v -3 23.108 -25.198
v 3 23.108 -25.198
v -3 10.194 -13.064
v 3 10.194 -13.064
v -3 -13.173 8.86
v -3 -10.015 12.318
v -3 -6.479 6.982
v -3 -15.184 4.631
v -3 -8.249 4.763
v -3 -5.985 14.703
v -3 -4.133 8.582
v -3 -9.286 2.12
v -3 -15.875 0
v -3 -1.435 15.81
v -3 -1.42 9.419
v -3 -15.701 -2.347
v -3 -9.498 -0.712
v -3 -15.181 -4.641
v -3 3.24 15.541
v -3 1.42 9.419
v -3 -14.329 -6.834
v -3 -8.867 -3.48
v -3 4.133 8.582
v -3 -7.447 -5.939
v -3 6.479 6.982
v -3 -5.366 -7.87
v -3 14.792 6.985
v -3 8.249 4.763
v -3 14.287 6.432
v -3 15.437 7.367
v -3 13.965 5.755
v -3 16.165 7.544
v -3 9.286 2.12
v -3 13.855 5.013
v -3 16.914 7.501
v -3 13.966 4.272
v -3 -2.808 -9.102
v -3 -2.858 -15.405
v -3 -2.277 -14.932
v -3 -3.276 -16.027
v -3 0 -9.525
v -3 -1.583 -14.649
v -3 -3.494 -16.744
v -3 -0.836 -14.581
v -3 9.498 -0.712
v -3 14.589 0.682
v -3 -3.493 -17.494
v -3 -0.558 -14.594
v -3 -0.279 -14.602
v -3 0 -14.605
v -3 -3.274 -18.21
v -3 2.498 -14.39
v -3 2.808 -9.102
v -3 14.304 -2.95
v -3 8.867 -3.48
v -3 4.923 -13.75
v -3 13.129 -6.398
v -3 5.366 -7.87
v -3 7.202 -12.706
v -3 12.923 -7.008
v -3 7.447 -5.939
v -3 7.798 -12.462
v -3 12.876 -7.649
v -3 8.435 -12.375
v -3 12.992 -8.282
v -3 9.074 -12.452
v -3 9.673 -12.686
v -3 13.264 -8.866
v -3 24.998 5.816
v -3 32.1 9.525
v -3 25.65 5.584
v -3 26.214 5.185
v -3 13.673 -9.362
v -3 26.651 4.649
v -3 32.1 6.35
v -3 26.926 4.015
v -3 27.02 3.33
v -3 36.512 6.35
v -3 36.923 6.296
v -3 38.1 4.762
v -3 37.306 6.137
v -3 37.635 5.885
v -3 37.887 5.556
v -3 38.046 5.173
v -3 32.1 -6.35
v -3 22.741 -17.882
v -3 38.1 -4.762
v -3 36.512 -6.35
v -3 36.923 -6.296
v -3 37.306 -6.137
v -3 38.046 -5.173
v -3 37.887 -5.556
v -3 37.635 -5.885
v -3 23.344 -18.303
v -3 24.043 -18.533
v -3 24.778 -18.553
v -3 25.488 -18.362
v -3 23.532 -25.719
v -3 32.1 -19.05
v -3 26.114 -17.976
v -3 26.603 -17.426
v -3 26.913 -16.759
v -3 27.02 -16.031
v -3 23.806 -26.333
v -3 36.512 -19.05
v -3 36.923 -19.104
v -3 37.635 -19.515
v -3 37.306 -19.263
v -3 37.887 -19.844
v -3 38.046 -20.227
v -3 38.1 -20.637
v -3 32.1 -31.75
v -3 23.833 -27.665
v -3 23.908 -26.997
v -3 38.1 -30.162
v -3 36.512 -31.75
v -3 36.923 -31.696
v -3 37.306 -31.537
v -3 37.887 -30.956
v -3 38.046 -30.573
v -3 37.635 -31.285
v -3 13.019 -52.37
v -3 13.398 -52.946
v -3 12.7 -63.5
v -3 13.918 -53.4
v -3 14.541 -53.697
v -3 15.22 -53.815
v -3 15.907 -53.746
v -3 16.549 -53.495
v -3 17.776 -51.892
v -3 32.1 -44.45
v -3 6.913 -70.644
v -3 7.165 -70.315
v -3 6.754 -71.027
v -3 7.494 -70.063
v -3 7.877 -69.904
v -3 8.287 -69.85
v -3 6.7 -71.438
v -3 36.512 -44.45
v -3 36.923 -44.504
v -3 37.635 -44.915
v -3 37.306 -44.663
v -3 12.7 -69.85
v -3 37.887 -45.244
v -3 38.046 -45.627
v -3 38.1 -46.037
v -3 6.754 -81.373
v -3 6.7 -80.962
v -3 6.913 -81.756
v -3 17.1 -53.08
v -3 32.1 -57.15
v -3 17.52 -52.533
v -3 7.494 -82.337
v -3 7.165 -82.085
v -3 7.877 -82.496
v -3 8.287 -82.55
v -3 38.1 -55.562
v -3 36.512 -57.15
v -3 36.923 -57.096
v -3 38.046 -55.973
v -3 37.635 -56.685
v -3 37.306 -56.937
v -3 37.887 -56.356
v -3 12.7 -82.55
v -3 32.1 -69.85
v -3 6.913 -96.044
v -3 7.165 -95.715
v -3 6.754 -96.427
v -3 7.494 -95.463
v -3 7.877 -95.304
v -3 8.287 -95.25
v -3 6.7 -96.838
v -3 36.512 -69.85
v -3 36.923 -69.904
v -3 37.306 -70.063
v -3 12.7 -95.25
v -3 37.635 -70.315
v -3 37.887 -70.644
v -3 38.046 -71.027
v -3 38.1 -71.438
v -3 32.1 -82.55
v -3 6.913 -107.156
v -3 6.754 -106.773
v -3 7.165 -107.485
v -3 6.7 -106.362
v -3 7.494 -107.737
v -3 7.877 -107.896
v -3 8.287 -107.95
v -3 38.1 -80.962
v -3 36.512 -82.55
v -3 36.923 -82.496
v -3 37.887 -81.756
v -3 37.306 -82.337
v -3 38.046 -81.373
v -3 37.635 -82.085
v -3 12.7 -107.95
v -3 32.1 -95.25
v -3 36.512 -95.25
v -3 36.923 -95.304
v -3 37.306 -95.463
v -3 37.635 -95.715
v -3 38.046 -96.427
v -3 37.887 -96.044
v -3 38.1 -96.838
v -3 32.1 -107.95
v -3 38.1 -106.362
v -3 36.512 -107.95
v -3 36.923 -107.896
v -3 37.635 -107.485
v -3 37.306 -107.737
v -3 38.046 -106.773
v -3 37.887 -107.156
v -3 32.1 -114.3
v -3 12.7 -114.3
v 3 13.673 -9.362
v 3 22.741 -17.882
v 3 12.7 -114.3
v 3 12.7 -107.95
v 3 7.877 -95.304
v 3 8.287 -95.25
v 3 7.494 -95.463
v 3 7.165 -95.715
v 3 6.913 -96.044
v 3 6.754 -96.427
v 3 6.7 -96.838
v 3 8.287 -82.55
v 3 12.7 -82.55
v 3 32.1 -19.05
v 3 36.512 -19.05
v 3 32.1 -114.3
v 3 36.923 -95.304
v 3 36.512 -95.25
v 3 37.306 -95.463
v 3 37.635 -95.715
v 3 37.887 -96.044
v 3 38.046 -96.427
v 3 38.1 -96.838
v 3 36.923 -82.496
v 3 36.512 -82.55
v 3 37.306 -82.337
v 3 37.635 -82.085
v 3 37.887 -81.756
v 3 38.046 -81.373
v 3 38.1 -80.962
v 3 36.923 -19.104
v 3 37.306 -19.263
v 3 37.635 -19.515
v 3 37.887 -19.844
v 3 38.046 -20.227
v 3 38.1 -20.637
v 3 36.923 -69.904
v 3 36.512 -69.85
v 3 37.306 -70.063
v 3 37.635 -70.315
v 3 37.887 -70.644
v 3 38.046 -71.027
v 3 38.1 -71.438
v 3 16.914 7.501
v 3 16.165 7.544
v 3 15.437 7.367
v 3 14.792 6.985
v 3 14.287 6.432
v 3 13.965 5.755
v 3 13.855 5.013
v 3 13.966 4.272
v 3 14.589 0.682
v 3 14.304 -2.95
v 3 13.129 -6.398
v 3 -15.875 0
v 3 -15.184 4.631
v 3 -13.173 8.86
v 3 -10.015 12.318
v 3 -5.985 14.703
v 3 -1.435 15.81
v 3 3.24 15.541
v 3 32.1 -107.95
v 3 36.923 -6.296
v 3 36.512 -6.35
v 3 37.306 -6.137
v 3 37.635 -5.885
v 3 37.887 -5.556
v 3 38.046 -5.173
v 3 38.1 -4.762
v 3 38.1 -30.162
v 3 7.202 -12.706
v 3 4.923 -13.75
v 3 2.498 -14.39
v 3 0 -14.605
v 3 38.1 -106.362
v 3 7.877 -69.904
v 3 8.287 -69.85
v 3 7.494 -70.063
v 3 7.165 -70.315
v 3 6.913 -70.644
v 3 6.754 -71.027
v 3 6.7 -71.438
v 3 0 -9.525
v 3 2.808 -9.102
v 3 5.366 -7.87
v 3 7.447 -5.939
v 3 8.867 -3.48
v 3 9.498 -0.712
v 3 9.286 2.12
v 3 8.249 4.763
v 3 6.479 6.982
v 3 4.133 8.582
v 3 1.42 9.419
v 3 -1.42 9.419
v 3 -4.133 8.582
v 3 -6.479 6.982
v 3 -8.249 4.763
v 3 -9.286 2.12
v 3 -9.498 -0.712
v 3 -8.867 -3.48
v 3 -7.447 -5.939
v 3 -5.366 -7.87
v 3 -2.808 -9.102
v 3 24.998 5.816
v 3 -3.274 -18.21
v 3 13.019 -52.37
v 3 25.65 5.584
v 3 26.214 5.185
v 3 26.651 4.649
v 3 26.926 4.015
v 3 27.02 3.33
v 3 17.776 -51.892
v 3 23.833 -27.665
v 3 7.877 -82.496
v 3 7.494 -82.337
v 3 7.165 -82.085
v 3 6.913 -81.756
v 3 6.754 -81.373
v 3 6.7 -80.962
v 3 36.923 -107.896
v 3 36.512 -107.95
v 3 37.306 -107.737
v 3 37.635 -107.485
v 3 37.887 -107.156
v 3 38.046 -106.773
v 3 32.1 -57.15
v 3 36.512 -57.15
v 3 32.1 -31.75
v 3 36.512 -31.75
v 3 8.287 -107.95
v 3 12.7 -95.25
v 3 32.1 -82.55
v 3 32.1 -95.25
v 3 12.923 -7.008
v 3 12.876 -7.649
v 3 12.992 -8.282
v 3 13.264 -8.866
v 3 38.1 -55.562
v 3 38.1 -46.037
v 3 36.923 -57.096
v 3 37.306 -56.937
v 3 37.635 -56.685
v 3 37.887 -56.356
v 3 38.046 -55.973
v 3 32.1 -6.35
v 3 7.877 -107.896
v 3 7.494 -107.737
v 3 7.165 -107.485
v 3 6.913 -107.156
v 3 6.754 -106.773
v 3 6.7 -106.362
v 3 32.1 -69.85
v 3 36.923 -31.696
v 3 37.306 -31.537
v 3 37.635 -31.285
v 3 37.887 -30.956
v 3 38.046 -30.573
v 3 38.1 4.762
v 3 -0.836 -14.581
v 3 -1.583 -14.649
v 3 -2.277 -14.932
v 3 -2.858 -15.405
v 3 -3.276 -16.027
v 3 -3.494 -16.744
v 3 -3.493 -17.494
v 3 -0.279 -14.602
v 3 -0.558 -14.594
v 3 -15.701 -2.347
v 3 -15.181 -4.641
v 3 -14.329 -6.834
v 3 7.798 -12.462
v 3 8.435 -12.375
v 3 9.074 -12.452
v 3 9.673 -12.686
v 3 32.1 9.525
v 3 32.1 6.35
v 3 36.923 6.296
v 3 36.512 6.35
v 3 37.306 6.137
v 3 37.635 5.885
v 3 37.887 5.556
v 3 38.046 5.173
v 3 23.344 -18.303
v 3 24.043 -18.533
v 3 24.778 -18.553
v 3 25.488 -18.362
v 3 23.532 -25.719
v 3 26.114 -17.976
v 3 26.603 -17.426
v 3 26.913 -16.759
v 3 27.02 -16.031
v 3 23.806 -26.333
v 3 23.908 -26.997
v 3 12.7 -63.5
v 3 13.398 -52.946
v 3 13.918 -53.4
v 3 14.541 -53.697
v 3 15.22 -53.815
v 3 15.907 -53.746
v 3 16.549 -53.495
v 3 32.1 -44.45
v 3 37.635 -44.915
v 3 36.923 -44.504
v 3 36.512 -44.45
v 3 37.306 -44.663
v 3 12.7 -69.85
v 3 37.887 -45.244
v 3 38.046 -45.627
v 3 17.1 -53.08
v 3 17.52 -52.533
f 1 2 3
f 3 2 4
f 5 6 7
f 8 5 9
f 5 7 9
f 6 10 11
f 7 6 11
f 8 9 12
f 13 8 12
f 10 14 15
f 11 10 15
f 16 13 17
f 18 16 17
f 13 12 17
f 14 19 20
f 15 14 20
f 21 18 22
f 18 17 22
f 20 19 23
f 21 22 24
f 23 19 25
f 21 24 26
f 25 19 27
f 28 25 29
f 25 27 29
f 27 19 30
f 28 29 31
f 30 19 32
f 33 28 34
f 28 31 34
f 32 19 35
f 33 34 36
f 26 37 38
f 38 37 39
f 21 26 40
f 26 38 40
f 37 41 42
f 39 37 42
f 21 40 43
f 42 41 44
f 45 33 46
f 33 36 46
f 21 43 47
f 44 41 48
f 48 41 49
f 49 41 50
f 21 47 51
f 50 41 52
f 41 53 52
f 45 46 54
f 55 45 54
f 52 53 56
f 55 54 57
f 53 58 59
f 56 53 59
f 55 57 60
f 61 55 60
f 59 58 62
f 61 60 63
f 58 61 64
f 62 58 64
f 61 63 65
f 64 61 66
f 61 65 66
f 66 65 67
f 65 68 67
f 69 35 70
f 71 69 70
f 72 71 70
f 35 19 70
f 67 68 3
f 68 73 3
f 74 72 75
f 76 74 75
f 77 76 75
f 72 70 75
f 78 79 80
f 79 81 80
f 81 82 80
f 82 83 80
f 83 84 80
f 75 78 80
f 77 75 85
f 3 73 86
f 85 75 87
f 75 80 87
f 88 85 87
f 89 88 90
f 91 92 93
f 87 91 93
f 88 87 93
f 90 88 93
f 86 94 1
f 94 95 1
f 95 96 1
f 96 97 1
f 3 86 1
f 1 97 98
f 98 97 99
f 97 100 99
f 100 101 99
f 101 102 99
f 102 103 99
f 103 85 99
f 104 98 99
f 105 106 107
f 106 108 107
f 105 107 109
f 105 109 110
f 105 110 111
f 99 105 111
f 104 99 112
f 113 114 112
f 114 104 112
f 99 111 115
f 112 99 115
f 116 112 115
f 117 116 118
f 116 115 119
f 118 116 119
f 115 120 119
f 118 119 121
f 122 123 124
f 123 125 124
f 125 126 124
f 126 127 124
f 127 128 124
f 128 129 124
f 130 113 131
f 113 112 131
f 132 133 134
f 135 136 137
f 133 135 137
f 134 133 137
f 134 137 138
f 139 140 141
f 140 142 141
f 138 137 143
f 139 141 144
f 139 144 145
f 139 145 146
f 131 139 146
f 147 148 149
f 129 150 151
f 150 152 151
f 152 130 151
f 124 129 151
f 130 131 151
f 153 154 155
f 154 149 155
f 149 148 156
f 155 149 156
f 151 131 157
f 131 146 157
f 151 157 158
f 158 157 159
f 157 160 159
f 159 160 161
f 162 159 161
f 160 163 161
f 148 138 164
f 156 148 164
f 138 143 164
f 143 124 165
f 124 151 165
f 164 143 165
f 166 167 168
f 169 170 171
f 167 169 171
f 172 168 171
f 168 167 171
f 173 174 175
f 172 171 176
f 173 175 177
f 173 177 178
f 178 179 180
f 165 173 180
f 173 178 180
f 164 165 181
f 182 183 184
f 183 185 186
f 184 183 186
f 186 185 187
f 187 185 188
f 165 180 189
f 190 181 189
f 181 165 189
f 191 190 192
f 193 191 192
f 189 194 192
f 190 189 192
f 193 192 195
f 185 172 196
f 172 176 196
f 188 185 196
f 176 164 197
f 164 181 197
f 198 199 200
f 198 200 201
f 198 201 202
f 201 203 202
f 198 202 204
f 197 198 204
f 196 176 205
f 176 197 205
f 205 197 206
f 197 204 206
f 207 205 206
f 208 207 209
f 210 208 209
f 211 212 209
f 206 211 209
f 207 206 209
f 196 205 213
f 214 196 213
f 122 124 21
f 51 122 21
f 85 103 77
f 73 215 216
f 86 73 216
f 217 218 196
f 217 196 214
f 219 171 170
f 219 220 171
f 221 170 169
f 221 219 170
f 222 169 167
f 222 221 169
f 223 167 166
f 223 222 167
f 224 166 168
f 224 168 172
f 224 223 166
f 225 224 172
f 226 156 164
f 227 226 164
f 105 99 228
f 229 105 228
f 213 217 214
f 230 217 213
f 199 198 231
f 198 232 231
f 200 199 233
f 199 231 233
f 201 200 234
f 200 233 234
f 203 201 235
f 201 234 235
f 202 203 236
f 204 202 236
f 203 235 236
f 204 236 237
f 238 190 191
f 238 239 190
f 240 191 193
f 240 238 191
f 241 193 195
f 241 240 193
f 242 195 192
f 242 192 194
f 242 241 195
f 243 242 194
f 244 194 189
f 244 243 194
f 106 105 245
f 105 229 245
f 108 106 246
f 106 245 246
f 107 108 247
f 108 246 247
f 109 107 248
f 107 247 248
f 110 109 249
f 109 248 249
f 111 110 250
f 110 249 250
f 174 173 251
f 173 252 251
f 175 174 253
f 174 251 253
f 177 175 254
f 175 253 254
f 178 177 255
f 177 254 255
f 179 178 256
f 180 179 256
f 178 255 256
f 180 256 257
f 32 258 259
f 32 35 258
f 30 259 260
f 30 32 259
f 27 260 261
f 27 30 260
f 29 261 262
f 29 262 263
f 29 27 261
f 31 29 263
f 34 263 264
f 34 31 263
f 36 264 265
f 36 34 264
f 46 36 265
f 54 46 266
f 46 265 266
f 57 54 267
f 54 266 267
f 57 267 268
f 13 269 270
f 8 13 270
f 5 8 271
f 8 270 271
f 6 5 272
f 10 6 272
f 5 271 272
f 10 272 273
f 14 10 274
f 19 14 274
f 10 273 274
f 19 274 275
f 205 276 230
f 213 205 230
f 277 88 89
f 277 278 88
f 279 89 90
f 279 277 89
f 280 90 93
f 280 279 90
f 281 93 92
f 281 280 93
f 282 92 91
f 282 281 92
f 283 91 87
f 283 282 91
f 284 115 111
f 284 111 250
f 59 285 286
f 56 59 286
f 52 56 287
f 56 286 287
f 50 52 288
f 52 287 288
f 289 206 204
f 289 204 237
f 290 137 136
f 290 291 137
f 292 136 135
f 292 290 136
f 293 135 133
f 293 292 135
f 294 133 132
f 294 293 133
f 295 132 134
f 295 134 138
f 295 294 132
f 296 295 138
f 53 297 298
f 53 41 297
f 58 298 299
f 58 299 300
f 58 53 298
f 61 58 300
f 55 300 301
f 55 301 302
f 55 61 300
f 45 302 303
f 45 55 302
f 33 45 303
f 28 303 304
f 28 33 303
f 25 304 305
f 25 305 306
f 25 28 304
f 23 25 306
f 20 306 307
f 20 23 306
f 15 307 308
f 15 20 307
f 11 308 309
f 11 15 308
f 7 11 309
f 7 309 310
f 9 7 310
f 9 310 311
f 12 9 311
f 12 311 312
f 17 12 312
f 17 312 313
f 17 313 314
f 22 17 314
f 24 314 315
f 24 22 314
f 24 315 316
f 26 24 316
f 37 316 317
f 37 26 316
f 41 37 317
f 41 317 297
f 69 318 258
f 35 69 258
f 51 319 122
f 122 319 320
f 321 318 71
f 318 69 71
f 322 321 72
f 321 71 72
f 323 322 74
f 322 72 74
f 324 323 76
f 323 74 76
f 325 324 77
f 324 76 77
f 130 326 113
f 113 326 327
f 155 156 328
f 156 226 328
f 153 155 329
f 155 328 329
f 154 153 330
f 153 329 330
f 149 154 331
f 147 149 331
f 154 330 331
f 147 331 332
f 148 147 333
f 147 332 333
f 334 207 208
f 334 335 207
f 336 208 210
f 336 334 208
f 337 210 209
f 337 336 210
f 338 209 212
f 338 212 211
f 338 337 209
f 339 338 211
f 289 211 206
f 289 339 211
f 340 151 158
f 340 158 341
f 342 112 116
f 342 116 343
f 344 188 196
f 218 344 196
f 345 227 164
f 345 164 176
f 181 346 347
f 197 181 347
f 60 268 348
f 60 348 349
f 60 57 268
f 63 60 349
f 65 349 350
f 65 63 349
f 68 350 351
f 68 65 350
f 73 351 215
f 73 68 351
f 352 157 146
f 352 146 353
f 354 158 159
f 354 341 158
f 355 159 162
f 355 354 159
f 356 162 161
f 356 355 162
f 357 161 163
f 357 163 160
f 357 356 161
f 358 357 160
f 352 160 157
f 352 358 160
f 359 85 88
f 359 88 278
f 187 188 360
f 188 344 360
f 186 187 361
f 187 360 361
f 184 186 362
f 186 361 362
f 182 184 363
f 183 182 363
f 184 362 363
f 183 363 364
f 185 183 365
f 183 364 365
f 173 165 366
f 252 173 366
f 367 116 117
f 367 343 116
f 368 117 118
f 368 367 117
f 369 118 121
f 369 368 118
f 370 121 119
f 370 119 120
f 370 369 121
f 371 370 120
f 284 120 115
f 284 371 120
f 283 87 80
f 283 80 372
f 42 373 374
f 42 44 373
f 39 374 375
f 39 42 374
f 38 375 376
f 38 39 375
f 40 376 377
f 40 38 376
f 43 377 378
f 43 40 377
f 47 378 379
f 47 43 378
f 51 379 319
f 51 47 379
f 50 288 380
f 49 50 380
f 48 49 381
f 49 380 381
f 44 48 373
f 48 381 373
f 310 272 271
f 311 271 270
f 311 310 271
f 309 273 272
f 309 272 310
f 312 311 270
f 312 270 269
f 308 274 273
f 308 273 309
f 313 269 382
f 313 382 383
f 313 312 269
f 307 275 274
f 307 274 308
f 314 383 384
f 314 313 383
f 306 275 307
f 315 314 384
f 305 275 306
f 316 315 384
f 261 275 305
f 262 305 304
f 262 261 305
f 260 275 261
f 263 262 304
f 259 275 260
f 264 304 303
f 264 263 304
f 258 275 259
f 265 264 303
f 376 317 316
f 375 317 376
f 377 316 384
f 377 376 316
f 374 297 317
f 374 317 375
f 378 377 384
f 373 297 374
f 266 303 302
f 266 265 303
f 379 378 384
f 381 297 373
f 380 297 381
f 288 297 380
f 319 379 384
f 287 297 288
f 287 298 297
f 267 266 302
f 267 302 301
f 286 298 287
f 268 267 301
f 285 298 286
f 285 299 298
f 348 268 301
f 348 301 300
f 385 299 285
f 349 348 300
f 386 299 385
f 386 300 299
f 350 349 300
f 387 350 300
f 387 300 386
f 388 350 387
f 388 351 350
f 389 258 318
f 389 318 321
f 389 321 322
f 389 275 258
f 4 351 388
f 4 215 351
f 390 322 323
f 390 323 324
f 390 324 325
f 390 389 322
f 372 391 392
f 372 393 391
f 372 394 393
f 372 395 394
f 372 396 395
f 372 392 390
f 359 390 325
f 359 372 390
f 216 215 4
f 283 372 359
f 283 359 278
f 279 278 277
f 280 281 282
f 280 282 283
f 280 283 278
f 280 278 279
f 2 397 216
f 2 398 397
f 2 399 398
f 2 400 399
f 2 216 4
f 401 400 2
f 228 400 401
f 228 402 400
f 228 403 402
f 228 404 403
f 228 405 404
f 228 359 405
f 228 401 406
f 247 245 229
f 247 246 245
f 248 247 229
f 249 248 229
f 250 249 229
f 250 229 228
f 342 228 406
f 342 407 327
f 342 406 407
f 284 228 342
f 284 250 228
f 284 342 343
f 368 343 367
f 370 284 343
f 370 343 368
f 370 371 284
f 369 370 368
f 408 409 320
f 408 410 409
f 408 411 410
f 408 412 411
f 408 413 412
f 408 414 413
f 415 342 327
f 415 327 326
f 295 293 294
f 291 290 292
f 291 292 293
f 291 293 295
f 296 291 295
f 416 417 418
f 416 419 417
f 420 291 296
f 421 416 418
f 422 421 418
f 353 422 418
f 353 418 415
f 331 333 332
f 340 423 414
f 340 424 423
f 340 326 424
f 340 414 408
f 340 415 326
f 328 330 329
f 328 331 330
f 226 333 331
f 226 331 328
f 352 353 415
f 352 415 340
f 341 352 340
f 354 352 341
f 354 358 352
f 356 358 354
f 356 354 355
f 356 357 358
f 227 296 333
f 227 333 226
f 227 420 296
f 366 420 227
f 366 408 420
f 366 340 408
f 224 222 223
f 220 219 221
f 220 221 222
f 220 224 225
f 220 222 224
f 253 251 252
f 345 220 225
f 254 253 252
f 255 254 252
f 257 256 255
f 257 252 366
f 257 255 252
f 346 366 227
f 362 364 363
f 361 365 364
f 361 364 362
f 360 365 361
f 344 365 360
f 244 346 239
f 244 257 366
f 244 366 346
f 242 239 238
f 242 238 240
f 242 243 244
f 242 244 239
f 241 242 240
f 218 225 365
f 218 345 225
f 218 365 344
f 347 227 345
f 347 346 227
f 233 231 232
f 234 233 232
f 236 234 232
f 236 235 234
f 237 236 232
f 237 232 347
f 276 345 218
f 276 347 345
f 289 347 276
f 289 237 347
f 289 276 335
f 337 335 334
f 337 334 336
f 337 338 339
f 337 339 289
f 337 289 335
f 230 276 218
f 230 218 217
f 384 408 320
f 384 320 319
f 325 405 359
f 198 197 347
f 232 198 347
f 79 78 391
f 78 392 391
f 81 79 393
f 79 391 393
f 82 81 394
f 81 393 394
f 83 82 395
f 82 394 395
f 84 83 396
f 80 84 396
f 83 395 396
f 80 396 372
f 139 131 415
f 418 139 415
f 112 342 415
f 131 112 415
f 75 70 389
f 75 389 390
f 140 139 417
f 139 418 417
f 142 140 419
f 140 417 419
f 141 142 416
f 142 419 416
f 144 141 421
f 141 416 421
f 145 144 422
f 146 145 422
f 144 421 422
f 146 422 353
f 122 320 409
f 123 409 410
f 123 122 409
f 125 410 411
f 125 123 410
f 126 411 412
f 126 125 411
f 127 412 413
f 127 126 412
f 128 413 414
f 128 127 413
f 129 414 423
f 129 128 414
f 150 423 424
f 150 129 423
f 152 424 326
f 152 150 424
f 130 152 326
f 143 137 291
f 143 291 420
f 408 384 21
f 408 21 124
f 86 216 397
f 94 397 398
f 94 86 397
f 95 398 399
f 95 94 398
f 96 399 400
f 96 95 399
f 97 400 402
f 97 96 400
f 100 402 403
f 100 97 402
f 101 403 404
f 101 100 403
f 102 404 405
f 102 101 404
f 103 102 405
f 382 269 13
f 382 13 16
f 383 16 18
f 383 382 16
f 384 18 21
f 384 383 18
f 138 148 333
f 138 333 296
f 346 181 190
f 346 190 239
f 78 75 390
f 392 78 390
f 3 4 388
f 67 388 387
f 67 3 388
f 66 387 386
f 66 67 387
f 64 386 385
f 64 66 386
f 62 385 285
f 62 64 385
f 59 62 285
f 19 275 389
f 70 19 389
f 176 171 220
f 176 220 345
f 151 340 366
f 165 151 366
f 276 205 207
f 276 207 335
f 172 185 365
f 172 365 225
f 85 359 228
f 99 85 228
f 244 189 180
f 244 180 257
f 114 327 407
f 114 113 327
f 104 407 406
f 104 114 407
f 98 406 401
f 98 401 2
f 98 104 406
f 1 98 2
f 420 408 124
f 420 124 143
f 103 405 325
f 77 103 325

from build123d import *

# Parameters (mm, degrees)
SKETCH1_R              = 9.525
BOSS_EXTRUDE1_DEPTH    = 3
CUT_EXTRUDE1_DEPTH     = 72.404901793
SKETCH4_W              = 50.8
SKETCH4_H              = 19.4
BOSS_EXTRUDE3_DEPTH    = 6
SKETCH3_W              = 6
SKETCH3_H              = 12.7
BOSS_EXTRUDE2_DEPTH    = 6
FILLET1_R              = 1.5875
LPATTERN1_COUNT        = 5
LPATTERN1_PITCH        = 25.4
FILLET1_OF_LPATTERN1_R = 1.5875
SKETCH5_W              = 12.7
SKETCH5_H              = 6
BOSS_EXTRUDE4_DEPTH    = 6
FILLET2_R              = 1.5875
LPATTERN2_COUNT        = 2
LPATTERN2_PITCH        = 25.4
FILLET2_OF_LPATTERN2_R = 1.5875
CUT_EXTRUDE2_DEPTH     = 121.632085284
FILLET3_R              = 2.54


with BuildPart() as part:
    # Sketch1 → Boss-Extrude1 (new, symmetric)
    with BuildSketch(Plane(origin=(0, 0, 0), x_dir=(0, 0, -1), z_dir=(1, 0, 0))):
        with BuildLine():
            Line((-15.540953853, 3.23950279), (-9.525, 32.1))
            Line((-9.525, 32.1), (63.5, 32.1))
            Line((63.5, 32.1), (63.5, -15.875))
            Line((63.5, -15.875), (0, -15.875))
            ThreePointArc((0, -15.875), (-12.317522717, -10.014702148), (-15.540953853, 3.23950279))
        make_face()
        Circle(SKETCH1_R, mode=Mode.SUBTRACT)
    extrude(amount=BOSS_EXTRUDE1_DEPTH, both=True)

    # Sketch2 → Cut-Extrude1 (cut, through all)
    with BuildSketch(Plane(origin=(3, 0, 0), x_dir=(0, 0, -1), z_dir=(1, 0, 0))):
        with BuildLine():
            Line((6.834450038, -14.328500189), (63.5, 12.7))
            Line((63.5, 12.7), (63.5, -15.875))
            Line((63.5, -15.875), (0, -15.875))
            ThreePointArc((0, -15.875), (3.50361845, -15.483548778), (6.834450038, -14.328500189))
        make_face()
    extrude(amount=-CUT_EXTRUDE1_DEPTH, mode=Mode.SUBTRACT)

    # Sketch4 → Boss-Extrude3 (add)
    with BuildSketch(Plane(origin=(3, 0, 0), x_dir=(0, 0, -1), z_dir=(1, 0, 0))):
        with Locations((88.9, 22.4)):
            Rectangle(SKETCH4_W, SKETCH4_H)
    extrude(amount=-BOSS_EXTRUDE3_DEPTH)

    # Sketch3 → Boss-Extrude2 (add)
    with BuildSketch(Plane(origin=(0, 32.1, 0), x_dir=(1, 0, 0), z_dir=(0, 1, 0))):
        Rectangle(SKETCH3_W, SKETCH3_H)
    boss_extrude2 = extrude(amount=BOSS_EXTRUDE2_DEPTH)

    # Fillet1
    fillet1_edges = [part.edges().sort_by_distance(p)[0] for p in [
        (0, 38.1, -6.35),
        (0, 38.1, 6.35),
    ]]
    fillet(fillet1_edges, radius=FILLET1_R)

    # LPattern1: Boss-Extrude2 ×5
    with Locations(*[(0, 0, -i * LPATTERN1_PITCH) for i in range(1, LPATTERN1_COUNT)]):
        add(boss_extrude2)

    # Fillet1 of LPattern1
    fillet1_of_lpattern1_edges = [part.edges().sort_by_distance(p)[0] for p in [
        (0, 38.1, -31.75),
        (0, 38.1, -19.05),
        (0, 38.1, -57.15),
        (0, 38.1, -44.45),
        (0, 38.1, -82.55),
        (0, 38.1, -69.85),
        (0, 38.1, -107.95),
        (0, 38.1, -95.25),
    ]]
    fillet(fillet1_of_lpattern1_edges, radius=FILLET1_OF_LPATTERN1_R)

    # Sketch5 → Boss-Extrude4 (add)
    with BuildSketch(Plane.ZY.offset(3)):
        with Locations((-76.2, 9.7)):
            Rectangle(SKETCH5_W, SKETCH5_H)
    boss_extrude4 = extrude(amount=-BOSS_EXTRUDE4_DEPTH)

    # Fillet2
    fillet2_edges = [part.edges().sort_by_distance(p)[0] for p in [
        (0, 6.7, -82.55),
        (0, 6.7, -69.85),
    ]]
    fillet(fillet2_edges, radius=FILLET2_R)

    # LPattern2: Boss-Extrude4 ×2
    with Locations(*[(0, 0, -i * LPATTERN2_PITCH) for i in range(1, LPATTERN2_COUNT)]):
        add(boss_extrude4)

    # Fillet2 of LPattern2
    fillet2_of_lpattern2_edges = [part.edges().sort_by_distance(p)[0] for p in [
        (0, 6.7, -107.95),
        (0, 6.7, -95.25),
    ]]
    fillet(fillet2_of_lpattern2_edges, radius=FILLET2_OF_LPATTERN2_R)

    # Sketch6 → Cut-Extrude2 (cut, through all)
    with BuildSketch(Plane(origin=(3, 0, 0), x_dir=(0, 0, -1), z_dir=(1, 0, 0))):
        with BuildLine():
            Line((-1.27, 27.02), (-5.394730621, 27.02))
            Line((-5.394730621, 27.02), (-8.560402164, 11.83323877))
            ThreePointArc((-8.560402164, 11.83323877), (-0.341722831, 14.601001695), (7.997440758, 12.220759646))
            Line((7.997440758, 12.220759646), (21.902982951, 27.02))
            Line((21.902982951, 27.02), (1.27, 27.02))
            Line((1.27, 27.02), (-1.27, 27.02))
        make_face()
        with BuildLine():
            ThreePointArc((14.605, 0), (14.332832255, -2.806411331), (13.526472843, -5.50822634))
            Line((13.526472843, -5.50822634), (58.749014948, 16.062154405))
            Line((58.749014948, 16.062154405), (26.218568583, 24.19428546))
            Line((26.218568583, 24.19428546), (11.699586285, 8.742179692))
            ThreePointArc((11.699586285, 8.742179692), (13.859626306, 4.606168001), (14.605, 0))
        make_face()
    extrude(amount=-CUT_EXTRUDE2_DEPTH, mode=Mode.SUBTRACT)

    # Fillet3
    fillet3_edges = [part.edges().sort_by_distance(p)[0] for p in [
        (0, -5.50822634, -13.526472843),
        (0, 8.742179692, -11.699586285),
        (0, 24.19428546, -26.218568583),
        (0, 16.062154405, -58.749014948),
        (0, 12.220759646, -7.997440758),
        (0, 11.83323877, 8.560402164),
        (0, 27.02, 5.394730621),
        (0, 27.02, -21.902982951),
    ]]
    fillet(fillet3_edges, radius=FILLET3_R)


solid = part.part
